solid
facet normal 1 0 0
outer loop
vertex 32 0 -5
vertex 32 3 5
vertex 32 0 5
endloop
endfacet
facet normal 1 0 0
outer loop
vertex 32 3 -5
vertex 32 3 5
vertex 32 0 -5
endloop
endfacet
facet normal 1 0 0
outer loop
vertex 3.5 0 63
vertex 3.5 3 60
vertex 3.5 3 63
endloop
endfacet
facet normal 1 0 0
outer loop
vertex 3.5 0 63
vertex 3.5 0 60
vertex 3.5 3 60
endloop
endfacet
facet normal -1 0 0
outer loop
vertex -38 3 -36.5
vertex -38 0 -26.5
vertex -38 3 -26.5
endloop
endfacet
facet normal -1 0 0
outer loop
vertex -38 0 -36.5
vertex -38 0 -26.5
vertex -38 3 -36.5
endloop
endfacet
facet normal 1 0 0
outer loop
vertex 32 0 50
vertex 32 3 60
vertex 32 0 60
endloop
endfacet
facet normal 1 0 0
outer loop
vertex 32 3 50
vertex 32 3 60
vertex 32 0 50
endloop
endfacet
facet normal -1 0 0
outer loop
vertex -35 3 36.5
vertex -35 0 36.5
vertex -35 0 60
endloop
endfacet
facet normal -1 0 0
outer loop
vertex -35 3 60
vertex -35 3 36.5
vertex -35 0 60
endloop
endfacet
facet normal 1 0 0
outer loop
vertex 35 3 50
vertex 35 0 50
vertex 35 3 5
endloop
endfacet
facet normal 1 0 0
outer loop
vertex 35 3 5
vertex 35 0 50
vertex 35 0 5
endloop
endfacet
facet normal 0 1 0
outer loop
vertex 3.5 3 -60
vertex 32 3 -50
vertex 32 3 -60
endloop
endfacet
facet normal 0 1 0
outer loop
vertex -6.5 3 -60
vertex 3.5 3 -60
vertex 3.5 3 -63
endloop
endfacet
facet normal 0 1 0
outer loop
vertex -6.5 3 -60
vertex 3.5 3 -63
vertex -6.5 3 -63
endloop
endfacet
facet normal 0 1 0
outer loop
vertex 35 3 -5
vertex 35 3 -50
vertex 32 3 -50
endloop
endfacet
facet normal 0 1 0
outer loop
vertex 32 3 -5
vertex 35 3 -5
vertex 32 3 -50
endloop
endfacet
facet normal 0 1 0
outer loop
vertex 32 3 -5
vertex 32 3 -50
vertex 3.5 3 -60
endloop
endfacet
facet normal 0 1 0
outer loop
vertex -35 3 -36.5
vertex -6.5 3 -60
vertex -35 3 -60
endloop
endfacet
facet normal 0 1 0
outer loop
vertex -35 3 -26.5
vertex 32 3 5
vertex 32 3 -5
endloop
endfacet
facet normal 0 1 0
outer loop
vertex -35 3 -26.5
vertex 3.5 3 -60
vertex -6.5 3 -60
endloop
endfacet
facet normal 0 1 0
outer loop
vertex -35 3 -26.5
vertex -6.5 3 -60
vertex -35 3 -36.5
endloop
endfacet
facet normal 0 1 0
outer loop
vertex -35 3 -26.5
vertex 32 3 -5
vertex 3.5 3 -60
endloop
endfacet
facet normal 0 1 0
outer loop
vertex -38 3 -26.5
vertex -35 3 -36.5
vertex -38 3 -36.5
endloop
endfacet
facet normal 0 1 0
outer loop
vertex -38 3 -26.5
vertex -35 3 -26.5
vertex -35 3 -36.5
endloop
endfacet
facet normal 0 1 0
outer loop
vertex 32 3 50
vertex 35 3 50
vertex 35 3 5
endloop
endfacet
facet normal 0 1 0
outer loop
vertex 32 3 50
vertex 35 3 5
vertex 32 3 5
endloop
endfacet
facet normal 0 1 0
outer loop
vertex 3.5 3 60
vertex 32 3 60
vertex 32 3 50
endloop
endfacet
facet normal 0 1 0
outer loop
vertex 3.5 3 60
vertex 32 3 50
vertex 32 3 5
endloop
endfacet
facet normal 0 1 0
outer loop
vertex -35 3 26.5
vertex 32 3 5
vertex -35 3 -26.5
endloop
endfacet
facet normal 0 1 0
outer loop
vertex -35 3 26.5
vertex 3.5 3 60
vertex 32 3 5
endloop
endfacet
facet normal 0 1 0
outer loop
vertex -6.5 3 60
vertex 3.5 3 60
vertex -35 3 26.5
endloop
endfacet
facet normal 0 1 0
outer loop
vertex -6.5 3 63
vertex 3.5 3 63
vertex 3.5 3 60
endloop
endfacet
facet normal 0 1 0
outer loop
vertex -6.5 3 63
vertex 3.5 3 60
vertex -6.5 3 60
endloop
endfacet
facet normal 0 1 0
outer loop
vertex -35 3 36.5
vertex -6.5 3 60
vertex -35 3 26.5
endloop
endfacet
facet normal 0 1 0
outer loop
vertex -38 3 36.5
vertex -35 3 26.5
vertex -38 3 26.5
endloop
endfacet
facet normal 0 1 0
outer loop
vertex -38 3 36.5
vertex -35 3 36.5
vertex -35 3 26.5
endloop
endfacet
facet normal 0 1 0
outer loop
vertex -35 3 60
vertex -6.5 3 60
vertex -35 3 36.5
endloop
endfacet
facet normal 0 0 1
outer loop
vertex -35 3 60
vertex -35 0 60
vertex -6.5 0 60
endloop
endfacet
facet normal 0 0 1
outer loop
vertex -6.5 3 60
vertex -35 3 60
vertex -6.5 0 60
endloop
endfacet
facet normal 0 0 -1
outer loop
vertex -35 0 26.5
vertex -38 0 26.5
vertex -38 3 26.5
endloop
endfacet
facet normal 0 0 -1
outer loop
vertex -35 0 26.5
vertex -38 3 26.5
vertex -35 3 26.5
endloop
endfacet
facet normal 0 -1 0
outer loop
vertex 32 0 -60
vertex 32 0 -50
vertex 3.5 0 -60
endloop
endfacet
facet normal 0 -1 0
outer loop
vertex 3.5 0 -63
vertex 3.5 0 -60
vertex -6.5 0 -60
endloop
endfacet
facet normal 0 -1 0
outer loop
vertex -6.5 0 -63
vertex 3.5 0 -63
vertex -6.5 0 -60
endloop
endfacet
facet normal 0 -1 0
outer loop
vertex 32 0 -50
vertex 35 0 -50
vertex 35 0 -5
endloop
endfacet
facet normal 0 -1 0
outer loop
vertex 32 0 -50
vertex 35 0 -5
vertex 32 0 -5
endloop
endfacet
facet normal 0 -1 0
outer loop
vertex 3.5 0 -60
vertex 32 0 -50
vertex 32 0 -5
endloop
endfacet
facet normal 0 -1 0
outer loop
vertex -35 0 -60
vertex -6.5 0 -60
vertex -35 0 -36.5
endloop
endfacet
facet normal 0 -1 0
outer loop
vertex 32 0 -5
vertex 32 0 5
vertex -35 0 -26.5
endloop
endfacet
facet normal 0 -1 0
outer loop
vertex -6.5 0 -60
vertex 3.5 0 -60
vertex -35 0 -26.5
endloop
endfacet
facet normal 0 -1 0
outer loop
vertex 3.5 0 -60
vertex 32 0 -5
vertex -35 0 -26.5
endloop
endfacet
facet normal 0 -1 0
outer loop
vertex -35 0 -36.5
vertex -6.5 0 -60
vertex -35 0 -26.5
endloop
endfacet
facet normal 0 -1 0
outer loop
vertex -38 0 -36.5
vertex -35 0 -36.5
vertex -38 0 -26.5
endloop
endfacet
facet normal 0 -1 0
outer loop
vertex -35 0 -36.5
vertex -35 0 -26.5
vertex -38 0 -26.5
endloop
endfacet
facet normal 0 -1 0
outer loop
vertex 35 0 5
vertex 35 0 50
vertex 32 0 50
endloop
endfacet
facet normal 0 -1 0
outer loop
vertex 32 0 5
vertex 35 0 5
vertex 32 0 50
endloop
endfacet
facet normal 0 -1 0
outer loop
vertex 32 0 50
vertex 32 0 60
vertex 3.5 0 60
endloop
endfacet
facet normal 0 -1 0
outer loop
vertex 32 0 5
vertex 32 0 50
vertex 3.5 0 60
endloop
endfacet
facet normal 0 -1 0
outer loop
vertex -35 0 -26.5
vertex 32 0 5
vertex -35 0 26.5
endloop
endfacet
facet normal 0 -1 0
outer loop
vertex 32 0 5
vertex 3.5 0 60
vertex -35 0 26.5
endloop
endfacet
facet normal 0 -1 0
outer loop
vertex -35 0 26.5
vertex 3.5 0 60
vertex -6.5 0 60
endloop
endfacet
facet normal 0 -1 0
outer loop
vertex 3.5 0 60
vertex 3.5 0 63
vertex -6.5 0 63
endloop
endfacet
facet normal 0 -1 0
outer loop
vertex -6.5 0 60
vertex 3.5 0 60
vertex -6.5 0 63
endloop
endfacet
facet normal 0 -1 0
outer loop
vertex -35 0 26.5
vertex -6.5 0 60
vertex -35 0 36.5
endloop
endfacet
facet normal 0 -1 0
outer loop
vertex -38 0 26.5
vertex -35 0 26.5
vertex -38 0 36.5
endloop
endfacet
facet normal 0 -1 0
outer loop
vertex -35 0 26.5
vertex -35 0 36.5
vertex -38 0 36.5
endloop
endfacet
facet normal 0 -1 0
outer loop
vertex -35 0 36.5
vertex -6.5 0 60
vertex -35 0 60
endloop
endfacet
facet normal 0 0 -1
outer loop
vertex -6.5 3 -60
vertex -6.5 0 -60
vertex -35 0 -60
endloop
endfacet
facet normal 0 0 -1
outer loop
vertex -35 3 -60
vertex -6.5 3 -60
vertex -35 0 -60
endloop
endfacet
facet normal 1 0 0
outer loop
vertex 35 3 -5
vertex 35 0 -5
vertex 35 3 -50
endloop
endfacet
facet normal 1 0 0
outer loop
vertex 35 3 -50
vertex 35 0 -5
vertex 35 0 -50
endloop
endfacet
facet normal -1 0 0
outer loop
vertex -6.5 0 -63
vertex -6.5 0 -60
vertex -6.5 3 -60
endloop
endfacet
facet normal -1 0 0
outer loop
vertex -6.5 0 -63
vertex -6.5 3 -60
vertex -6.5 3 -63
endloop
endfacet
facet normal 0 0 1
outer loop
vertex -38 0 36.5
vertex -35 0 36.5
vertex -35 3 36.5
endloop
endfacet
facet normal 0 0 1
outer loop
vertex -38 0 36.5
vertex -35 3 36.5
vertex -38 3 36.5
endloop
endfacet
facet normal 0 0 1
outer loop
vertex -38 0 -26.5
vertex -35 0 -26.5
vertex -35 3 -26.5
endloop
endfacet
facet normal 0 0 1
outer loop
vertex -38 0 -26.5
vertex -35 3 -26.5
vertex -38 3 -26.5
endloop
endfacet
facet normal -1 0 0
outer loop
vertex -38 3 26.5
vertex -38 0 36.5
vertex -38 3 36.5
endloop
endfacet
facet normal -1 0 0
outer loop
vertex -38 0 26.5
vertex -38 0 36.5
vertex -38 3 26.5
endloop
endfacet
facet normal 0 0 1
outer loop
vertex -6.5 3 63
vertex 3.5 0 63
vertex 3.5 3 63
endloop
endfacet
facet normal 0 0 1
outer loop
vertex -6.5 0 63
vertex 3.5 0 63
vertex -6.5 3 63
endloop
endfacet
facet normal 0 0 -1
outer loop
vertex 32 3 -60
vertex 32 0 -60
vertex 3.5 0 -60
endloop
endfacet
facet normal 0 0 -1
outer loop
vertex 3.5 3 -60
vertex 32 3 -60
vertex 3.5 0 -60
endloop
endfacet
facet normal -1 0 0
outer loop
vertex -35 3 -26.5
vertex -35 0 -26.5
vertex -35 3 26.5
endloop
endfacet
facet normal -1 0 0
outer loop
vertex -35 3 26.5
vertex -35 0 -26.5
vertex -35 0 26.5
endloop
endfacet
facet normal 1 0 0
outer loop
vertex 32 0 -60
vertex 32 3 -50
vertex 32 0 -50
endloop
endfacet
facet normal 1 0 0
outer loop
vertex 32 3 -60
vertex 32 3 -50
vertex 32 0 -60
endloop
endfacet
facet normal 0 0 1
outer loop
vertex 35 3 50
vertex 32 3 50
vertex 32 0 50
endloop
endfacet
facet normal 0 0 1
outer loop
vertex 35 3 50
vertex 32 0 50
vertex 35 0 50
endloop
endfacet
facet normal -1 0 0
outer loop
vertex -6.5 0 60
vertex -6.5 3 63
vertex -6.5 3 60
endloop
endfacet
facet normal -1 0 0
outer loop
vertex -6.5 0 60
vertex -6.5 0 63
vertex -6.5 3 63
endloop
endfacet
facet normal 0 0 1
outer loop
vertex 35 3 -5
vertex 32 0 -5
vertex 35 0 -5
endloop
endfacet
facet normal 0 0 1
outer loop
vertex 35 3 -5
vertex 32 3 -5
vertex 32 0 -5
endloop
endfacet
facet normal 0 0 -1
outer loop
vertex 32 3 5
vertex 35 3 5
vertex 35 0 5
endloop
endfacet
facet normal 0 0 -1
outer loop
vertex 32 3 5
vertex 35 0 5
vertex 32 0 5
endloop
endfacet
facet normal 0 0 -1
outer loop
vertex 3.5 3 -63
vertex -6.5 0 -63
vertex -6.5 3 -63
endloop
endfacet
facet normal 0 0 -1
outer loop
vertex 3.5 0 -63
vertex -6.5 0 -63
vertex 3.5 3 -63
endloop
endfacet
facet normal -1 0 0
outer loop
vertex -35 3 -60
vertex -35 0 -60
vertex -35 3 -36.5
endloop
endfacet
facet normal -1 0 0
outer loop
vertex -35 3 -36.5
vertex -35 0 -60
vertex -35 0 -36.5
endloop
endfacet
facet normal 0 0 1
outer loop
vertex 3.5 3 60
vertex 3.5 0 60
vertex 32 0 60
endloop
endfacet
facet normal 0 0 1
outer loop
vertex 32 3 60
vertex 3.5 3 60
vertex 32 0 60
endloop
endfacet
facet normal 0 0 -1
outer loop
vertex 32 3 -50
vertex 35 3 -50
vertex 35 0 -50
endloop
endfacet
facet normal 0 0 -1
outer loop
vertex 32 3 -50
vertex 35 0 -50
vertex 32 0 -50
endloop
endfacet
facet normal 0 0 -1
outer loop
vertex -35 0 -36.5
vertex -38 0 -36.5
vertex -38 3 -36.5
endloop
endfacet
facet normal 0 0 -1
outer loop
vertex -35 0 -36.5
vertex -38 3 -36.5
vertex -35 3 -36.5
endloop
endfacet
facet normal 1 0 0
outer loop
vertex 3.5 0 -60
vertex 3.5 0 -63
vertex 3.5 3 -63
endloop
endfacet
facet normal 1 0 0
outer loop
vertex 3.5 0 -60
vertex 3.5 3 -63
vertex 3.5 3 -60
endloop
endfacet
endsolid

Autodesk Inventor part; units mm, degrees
ref_plane "YZ Plane" through (0, 0, 0) normal (1, 0, 0) x (0, 1, 0)
ref_plane "XZ Plane" through (0, 0, 0) normal (0, 1, 0) x (-1, 0, 0)
ref_plane "XY Plane" through (0, 0, 0) normal (0, 0, 1) x (1, 0, 0)
sketch "Sketch1" plane through (0, 0, 0) normal (0, 1, 0) x (-1, 0, 0)
  line L0 (-35, -60) -> (35, -60)
  line L1 (35, -60) -> (35, 60)
  line L2 (35, 60) -> (-35, 60)
  line L3 (-35, 60) -> (-35, -60)
  line L4 (-35, -60) -> (35, 60) construction
  line L5 (35, -60) -> (-35, 60) construction
  point P0 (0, 0)
  dimension "d0" = 70
  dimension "d1" = 120
extrude "Extrusion1" add sketch "Sketch1" along normal blind 3
sketch "Sketch2" plane through (0, 3, 0) normal (0, 1, 0) x (1, 0, 0)
  line L0 (35, -60) -> (32, -60)
  line L1 (32, -60) -> (32, -50)
  line L2 (32, -50) -> (35, -50)
  line L3 (35, -50) -> (35, -60)
  line L4 (35, -5) -> (32, -5)
  line L5 (32, -5) -> (32, 5)
  line L6 (32, 5) -> (35, 5)
  line L7 (35, 5) -> (35, -5)
  line L8 (35, 50) -> (32, 50)
  line L9 (32, 50) -> (32, 60)
  line L10 (32, 60) -> (35, 60)
  line L11 (35, 60) -> (35, 50)
  line L12 (35, -60) -> (35, 60) projected
  point P0 (0, 0)
  point P1 (35, 0)
  dimension "d4" = 3
  dimension "d5" = 10
  dimension "d6" = 3
  dimension "d7" = 10
  dimension "d8" = 10
extrude "Extrusion2" cut sketch "Sketch2" against normal through all
sketch "Sketch3" plane through (0, 0, 0) normal (0, -1, 0) x (1, 0, 0)
  line L0 (32, -60) -> (-35, -60) projected
  line L1 (3.5, 63) -> (-6.5, 63)
  line L2 (-6.5, 63) -> (-6.5, 60)
  line L3 (-6.5, 60) -> (3.5, 60)
  line L4 (3.5, 60) -> (3.5, 63)
  line L5 (3.5, -60) -> (-6.5, -60)
  line L6 (-6.5, -60) -> (-6.5, -63)
  line L7 (-6.5, -63) -> (3.5, -63)
  line L8 (3.5, -63) -> (3.5, -60)
  line L9 (-35, -60) -> (-35, 60) projected
  line L10 (-35, 60) -> (-25, 60)
  line L11 (-25, 60) -> (-25, 63)
  line L12 (-25, 63) -> (-35, 63)
  line L13 (-35, 63) -> (-35, 60)
  line L14 (-35, -60) -> (-25, -60)
  line L15 (-25, -60) -> (-25, -63)
  line L16 (-25, -63) -> (-35, -63)
  line L17 (-35, -63) -> (-35, -60)
  point P0 (0, 0)
  point P1 (32, 60)
  point P2 (-1.5, 60)
  point P3 (-1.5, -60)
  dimension "d15" = 10
  dimension "d16" = 3
  dimension "d17" = 10
  dimension "d18" = 3
  dimension "d21" = 10
  dimension "d22" = 10
extrude "Extrusion3" add sketch "Sketch3" against normal blind 3 contours L8 L7 L6 L0 | L4 L3 L2 L1
sketch "Sketch4" plane through (0, 0, 0) normal (0, -1, 0) x (1, 0, 0)
  line L0 (-38, -36.5) -> (-35, -36.5)
  line L1 (-35, -36.5) -> (-35, -26.5)
  line L2 (-35, -26.5) -> (-38, -26.5)
  line L3 (-38, -26.5) -> (-38, -36.5)
  line L4 (-38, 26.5) -> (-35, 26.5)
  line L5 (-35, 26.5) -> (-35, 36.5)
  line L6 (-35, 36.5) -> (-38, 36.5)
  line L7 (-38, 36.5) -> (-38, 26.5)
  line L8 (-35, -60) -> (-35, 60) projected
  point P0 (0, 0)
  point P1 (-35, -31.5)
  point P2 (-35, -63)
  point P3 (-35, 63)
  point P4 (-35, 31.5)
  point P5 (-35, 0)
  point P6 (-35, 0)
  dimension "d23" = 3
  dimension "d24" = 10
  dimension "d25" = 3
  dimension "d26" = 10
  dimension "d27" = 126
  dimension "d28" = 31.5
  dimension "d29" = 31.5
extrude "Extrusion4" add sketch "Sketch4" against normal blind 3
sketch "Sketch5" plane through (0, 3, 0) normal (0, 1, 0) x (1, 0, 0)
  line L0 (35, -50) -> (32, -50) projected
  line L1 (32, -50) -> (32, -60) projected
  line L2 (32, -60) -> (3.5, -60) projected
  line L3 (3.5, -60) -> (3.5, -63) projected
  line L4 (3.5, -63) -> (-6.5, -63) projected
  line L5 (-6.5, -63) -> (-6.5, -60) projected
  line L6 (-6.5, -60) -> (-35, -60) projected
  line L7 (-35, -60) -> (-35, -36.5) projected
  line L8 (-35, -36.5) -> (-38, -36.5) projected
  line L9 (-38, -36.5) -> (-38, -26.5) projected
  line L10 (-38, -26.5) -> (-35, -26.5) projected
  line L11 (-35, -26.5) -> (-35, 26.5) projected
  line L12 (-35, 26.5) -> (-38, 26.5) projected
  line L13 (-38, 26.5) -> (-38, 36.5) projected
  line L14 (-38, 36.5) -> (-35, 36.5) projected
  line L15 (-35, 36.5) -> (-35, 60) projected
  line L16 (-35, 60) -> (-6.5, 60) projected
  line L17 (-6.5, 60) -> (-6.5, 63) projected
  line L18 (-6.5, 63) -> (3.5, 63) projected
  line L19 (3.5, 63) -> (3.5, 60) projected
  line L20 (3.5, 60) -> (32, 60) projected
  line L21 (32, 60) -> (32, 50) projected
  line L22 (32, 50) -> (35, 50) projected
  line L23 (35, 50) -> (35, 5) projected
  line L24 (35, 5) -> (32, 5) projected
  line L25 (32, 5) -> (32, -5) projected
  line L26 (32, -5) -> (35, -5) projected
  line L27 (35, -5) -> (35, -50) projected
  point P0 (0, 0)
equation "\"d28\" = 0.25 * d27"
equation "\"d29\" = d28"
properties part number "Bottom"
